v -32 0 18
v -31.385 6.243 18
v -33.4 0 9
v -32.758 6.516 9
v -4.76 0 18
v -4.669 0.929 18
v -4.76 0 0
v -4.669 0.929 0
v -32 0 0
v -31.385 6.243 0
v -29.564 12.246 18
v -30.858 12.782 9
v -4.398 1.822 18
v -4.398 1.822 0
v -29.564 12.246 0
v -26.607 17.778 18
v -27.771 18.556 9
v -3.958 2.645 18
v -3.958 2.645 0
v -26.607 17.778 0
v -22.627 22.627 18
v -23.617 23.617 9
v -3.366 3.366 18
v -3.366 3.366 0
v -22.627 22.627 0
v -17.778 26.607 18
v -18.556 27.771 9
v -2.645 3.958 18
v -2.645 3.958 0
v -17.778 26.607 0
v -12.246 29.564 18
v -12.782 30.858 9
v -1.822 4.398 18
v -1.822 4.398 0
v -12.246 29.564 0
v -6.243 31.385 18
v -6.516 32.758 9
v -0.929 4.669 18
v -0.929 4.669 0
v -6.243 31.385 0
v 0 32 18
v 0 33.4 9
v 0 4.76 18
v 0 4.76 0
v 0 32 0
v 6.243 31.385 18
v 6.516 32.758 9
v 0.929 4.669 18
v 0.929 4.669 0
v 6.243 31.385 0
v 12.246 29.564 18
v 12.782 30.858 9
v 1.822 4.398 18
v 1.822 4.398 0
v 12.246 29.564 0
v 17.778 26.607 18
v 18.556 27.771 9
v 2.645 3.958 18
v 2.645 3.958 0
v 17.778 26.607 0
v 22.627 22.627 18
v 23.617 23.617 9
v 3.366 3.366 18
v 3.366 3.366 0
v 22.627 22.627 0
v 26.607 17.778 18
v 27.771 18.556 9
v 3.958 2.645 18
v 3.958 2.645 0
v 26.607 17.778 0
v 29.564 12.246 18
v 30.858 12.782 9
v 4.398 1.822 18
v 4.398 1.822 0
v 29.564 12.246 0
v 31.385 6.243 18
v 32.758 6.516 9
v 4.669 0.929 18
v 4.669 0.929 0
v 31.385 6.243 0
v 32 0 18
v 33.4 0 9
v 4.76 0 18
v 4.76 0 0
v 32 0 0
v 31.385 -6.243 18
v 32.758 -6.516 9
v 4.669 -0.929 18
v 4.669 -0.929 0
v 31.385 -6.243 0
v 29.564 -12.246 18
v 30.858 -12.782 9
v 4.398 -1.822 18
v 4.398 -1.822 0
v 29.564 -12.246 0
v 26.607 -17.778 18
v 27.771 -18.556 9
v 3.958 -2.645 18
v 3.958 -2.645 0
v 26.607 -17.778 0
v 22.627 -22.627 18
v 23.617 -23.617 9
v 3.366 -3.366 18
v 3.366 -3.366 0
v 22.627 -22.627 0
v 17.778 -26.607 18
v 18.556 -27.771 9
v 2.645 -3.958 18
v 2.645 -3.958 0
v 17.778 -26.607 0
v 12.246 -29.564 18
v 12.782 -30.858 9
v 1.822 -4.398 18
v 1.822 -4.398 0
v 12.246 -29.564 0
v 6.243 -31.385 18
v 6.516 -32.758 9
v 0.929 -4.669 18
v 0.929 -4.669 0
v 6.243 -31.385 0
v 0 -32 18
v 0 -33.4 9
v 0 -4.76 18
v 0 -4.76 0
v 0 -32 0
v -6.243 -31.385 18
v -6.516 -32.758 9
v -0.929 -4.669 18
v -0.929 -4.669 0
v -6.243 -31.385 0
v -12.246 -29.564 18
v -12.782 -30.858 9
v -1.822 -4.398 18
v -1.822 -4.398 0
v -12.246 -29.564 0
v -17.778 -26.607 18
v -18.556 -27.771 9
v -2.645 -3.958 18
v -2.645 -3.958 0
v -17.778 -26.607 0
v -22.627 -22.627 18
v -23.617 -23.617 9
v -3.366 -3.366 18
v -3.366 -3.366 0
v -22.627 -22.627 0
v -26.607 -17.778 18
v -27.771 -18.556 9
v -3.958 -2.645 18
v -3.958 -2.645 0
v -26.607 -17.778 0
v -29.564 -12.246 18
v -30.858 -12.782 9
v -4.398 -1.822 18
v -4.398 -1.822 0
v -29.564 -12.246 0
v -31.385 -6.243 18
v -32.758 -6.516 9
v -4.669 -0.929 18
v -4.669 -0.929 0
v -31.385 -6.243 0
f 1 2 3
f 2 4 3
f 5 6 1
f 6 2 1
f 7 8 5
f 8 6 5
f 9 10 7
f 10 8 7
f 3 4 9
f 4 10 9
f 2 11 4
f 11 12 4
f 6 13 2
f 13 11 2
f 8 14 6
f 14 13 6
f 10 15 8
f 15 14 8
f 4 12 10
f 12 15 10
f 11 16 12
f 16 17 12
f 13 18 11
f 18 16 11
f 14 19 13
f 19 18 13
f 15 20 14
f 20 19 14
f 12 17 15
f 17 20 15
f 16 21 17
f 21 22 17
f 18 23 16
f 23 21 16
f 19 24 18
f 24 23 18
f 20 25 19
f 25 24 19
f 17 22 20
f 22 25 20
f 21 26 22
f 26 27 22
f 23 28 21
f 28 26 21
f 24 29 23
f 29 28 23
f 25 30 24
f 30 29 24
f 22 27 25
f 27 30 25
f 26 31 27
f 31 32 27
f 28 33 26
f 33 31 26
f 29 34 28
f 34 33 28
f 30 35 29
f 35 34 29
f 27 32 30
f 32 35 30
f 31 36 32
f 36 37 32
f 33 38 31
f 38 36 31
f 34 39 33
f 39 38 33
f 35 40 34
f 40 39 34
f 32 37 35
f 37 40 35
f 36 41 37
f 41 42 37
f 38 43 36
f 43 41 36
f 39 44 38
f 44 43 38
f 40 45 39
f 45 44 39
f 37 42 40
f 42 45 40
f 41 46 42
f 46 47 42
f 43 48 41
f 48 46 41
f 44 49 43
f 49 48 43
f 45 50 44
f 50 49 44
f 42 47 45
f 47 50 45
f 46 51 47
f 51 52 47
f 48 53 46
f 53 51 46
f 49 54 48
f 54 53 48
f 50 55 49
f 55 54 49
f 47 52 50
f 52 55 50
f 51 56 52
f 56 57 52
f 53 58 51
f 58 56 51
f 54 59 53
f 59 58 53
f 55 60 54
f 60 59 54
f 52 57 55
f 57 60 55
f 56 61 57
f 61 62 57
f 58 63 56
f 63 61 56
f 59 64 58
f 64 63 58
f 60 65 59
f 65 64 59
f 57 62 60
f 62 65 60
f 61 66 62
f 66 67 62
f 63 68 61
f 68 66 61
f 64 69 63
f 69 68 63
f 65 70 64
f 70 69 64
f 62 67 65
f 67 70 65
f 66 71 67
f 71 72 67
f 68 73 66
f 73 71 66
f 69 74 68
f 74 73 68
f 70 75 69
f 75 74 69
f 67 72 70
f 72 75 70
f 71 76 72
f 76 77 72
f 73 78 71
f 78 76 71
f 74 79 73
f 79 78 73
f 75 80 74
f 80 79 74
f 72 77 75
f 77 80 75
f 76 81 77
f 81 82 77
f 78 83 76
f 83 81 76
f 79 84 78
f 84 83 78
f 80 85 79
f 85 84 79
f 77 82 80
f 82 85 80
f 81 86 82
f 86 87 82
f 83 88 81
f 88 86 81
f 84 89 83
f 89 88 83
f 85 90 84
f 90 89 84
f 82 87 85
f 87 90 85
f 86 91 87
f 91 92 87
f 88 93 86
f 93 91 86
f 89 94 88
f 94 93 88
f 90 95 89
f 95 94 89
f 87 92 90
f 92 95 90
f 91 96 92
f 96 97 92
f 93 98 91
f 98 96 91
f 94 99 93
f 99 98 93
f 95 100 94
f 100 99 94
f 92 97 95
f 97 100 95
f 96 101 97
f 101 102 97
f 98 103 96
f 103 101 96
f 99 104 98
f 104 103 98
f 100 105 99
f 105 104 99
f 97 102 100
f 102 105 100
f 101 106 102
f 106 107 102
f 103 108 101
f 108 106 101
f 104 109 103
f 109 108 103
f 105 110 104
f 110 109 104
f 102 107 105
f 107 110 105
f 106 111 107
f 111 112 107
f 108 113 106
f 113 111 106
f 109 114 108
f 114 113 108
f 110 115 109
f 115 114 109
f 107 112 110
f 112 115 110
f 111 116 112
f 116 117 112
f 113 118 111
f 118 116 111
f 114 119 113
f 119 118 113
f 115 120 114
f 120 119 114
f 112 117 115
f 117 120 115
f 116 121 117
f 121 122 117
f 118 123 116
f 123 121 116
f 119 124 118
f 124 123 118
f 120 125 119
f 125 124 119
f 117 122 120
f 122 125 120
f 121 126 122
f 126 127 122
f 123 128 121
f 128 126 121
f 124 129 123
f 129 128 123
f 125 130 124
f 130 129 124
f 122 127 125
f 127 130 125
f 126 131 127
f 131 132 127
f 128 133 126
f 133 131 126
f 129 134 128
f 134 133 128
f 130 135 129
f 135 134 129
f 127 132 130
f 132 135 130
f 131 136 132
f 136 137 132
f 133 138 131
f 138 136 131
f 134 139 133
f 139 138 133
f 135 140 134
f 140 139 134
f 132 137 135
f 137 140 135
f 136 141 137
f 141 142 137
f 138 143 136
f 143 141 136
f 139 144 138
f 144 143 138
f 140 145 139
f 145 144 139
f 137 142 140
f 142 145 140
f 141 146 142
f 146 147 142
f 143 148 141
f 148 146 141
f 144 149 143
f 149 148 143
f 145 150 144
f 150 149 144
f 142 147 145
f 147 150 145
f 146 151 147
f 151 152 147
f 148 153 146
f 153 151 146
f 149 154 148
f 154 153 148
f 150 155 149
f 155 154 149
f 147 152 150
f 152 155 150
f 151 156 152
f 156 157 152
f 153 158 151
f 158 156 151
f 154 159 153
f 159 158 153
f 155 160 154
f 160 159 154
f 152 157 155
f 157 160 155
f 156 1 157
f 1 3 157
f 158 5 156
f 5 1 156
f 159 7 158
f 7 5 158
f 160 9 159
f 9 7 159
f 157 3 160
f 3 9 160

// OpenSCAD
$fn = 32;

// ----------------------------------------------------------------------
// Belt roller: 64 mm barrel, 18 mm wide, bore 9.52 mm
// ----------------------------------------------------------------------

// --- parameters (mm) ---
bore_d = 9.52;            // bore
barrel_d = 64;            // barrel diameter
roller_w = 18;            // roller width
crown = 1.4;              // crown height at mid width

roller_profile = [[4.76, 0], [32, 0], [33.4, 9], [32, 18], [4.76, 18]];

/* the profile stays clear of the axis, so the bore comes out of the revolve */
rotate_extrude() polygon(roller_profile);
